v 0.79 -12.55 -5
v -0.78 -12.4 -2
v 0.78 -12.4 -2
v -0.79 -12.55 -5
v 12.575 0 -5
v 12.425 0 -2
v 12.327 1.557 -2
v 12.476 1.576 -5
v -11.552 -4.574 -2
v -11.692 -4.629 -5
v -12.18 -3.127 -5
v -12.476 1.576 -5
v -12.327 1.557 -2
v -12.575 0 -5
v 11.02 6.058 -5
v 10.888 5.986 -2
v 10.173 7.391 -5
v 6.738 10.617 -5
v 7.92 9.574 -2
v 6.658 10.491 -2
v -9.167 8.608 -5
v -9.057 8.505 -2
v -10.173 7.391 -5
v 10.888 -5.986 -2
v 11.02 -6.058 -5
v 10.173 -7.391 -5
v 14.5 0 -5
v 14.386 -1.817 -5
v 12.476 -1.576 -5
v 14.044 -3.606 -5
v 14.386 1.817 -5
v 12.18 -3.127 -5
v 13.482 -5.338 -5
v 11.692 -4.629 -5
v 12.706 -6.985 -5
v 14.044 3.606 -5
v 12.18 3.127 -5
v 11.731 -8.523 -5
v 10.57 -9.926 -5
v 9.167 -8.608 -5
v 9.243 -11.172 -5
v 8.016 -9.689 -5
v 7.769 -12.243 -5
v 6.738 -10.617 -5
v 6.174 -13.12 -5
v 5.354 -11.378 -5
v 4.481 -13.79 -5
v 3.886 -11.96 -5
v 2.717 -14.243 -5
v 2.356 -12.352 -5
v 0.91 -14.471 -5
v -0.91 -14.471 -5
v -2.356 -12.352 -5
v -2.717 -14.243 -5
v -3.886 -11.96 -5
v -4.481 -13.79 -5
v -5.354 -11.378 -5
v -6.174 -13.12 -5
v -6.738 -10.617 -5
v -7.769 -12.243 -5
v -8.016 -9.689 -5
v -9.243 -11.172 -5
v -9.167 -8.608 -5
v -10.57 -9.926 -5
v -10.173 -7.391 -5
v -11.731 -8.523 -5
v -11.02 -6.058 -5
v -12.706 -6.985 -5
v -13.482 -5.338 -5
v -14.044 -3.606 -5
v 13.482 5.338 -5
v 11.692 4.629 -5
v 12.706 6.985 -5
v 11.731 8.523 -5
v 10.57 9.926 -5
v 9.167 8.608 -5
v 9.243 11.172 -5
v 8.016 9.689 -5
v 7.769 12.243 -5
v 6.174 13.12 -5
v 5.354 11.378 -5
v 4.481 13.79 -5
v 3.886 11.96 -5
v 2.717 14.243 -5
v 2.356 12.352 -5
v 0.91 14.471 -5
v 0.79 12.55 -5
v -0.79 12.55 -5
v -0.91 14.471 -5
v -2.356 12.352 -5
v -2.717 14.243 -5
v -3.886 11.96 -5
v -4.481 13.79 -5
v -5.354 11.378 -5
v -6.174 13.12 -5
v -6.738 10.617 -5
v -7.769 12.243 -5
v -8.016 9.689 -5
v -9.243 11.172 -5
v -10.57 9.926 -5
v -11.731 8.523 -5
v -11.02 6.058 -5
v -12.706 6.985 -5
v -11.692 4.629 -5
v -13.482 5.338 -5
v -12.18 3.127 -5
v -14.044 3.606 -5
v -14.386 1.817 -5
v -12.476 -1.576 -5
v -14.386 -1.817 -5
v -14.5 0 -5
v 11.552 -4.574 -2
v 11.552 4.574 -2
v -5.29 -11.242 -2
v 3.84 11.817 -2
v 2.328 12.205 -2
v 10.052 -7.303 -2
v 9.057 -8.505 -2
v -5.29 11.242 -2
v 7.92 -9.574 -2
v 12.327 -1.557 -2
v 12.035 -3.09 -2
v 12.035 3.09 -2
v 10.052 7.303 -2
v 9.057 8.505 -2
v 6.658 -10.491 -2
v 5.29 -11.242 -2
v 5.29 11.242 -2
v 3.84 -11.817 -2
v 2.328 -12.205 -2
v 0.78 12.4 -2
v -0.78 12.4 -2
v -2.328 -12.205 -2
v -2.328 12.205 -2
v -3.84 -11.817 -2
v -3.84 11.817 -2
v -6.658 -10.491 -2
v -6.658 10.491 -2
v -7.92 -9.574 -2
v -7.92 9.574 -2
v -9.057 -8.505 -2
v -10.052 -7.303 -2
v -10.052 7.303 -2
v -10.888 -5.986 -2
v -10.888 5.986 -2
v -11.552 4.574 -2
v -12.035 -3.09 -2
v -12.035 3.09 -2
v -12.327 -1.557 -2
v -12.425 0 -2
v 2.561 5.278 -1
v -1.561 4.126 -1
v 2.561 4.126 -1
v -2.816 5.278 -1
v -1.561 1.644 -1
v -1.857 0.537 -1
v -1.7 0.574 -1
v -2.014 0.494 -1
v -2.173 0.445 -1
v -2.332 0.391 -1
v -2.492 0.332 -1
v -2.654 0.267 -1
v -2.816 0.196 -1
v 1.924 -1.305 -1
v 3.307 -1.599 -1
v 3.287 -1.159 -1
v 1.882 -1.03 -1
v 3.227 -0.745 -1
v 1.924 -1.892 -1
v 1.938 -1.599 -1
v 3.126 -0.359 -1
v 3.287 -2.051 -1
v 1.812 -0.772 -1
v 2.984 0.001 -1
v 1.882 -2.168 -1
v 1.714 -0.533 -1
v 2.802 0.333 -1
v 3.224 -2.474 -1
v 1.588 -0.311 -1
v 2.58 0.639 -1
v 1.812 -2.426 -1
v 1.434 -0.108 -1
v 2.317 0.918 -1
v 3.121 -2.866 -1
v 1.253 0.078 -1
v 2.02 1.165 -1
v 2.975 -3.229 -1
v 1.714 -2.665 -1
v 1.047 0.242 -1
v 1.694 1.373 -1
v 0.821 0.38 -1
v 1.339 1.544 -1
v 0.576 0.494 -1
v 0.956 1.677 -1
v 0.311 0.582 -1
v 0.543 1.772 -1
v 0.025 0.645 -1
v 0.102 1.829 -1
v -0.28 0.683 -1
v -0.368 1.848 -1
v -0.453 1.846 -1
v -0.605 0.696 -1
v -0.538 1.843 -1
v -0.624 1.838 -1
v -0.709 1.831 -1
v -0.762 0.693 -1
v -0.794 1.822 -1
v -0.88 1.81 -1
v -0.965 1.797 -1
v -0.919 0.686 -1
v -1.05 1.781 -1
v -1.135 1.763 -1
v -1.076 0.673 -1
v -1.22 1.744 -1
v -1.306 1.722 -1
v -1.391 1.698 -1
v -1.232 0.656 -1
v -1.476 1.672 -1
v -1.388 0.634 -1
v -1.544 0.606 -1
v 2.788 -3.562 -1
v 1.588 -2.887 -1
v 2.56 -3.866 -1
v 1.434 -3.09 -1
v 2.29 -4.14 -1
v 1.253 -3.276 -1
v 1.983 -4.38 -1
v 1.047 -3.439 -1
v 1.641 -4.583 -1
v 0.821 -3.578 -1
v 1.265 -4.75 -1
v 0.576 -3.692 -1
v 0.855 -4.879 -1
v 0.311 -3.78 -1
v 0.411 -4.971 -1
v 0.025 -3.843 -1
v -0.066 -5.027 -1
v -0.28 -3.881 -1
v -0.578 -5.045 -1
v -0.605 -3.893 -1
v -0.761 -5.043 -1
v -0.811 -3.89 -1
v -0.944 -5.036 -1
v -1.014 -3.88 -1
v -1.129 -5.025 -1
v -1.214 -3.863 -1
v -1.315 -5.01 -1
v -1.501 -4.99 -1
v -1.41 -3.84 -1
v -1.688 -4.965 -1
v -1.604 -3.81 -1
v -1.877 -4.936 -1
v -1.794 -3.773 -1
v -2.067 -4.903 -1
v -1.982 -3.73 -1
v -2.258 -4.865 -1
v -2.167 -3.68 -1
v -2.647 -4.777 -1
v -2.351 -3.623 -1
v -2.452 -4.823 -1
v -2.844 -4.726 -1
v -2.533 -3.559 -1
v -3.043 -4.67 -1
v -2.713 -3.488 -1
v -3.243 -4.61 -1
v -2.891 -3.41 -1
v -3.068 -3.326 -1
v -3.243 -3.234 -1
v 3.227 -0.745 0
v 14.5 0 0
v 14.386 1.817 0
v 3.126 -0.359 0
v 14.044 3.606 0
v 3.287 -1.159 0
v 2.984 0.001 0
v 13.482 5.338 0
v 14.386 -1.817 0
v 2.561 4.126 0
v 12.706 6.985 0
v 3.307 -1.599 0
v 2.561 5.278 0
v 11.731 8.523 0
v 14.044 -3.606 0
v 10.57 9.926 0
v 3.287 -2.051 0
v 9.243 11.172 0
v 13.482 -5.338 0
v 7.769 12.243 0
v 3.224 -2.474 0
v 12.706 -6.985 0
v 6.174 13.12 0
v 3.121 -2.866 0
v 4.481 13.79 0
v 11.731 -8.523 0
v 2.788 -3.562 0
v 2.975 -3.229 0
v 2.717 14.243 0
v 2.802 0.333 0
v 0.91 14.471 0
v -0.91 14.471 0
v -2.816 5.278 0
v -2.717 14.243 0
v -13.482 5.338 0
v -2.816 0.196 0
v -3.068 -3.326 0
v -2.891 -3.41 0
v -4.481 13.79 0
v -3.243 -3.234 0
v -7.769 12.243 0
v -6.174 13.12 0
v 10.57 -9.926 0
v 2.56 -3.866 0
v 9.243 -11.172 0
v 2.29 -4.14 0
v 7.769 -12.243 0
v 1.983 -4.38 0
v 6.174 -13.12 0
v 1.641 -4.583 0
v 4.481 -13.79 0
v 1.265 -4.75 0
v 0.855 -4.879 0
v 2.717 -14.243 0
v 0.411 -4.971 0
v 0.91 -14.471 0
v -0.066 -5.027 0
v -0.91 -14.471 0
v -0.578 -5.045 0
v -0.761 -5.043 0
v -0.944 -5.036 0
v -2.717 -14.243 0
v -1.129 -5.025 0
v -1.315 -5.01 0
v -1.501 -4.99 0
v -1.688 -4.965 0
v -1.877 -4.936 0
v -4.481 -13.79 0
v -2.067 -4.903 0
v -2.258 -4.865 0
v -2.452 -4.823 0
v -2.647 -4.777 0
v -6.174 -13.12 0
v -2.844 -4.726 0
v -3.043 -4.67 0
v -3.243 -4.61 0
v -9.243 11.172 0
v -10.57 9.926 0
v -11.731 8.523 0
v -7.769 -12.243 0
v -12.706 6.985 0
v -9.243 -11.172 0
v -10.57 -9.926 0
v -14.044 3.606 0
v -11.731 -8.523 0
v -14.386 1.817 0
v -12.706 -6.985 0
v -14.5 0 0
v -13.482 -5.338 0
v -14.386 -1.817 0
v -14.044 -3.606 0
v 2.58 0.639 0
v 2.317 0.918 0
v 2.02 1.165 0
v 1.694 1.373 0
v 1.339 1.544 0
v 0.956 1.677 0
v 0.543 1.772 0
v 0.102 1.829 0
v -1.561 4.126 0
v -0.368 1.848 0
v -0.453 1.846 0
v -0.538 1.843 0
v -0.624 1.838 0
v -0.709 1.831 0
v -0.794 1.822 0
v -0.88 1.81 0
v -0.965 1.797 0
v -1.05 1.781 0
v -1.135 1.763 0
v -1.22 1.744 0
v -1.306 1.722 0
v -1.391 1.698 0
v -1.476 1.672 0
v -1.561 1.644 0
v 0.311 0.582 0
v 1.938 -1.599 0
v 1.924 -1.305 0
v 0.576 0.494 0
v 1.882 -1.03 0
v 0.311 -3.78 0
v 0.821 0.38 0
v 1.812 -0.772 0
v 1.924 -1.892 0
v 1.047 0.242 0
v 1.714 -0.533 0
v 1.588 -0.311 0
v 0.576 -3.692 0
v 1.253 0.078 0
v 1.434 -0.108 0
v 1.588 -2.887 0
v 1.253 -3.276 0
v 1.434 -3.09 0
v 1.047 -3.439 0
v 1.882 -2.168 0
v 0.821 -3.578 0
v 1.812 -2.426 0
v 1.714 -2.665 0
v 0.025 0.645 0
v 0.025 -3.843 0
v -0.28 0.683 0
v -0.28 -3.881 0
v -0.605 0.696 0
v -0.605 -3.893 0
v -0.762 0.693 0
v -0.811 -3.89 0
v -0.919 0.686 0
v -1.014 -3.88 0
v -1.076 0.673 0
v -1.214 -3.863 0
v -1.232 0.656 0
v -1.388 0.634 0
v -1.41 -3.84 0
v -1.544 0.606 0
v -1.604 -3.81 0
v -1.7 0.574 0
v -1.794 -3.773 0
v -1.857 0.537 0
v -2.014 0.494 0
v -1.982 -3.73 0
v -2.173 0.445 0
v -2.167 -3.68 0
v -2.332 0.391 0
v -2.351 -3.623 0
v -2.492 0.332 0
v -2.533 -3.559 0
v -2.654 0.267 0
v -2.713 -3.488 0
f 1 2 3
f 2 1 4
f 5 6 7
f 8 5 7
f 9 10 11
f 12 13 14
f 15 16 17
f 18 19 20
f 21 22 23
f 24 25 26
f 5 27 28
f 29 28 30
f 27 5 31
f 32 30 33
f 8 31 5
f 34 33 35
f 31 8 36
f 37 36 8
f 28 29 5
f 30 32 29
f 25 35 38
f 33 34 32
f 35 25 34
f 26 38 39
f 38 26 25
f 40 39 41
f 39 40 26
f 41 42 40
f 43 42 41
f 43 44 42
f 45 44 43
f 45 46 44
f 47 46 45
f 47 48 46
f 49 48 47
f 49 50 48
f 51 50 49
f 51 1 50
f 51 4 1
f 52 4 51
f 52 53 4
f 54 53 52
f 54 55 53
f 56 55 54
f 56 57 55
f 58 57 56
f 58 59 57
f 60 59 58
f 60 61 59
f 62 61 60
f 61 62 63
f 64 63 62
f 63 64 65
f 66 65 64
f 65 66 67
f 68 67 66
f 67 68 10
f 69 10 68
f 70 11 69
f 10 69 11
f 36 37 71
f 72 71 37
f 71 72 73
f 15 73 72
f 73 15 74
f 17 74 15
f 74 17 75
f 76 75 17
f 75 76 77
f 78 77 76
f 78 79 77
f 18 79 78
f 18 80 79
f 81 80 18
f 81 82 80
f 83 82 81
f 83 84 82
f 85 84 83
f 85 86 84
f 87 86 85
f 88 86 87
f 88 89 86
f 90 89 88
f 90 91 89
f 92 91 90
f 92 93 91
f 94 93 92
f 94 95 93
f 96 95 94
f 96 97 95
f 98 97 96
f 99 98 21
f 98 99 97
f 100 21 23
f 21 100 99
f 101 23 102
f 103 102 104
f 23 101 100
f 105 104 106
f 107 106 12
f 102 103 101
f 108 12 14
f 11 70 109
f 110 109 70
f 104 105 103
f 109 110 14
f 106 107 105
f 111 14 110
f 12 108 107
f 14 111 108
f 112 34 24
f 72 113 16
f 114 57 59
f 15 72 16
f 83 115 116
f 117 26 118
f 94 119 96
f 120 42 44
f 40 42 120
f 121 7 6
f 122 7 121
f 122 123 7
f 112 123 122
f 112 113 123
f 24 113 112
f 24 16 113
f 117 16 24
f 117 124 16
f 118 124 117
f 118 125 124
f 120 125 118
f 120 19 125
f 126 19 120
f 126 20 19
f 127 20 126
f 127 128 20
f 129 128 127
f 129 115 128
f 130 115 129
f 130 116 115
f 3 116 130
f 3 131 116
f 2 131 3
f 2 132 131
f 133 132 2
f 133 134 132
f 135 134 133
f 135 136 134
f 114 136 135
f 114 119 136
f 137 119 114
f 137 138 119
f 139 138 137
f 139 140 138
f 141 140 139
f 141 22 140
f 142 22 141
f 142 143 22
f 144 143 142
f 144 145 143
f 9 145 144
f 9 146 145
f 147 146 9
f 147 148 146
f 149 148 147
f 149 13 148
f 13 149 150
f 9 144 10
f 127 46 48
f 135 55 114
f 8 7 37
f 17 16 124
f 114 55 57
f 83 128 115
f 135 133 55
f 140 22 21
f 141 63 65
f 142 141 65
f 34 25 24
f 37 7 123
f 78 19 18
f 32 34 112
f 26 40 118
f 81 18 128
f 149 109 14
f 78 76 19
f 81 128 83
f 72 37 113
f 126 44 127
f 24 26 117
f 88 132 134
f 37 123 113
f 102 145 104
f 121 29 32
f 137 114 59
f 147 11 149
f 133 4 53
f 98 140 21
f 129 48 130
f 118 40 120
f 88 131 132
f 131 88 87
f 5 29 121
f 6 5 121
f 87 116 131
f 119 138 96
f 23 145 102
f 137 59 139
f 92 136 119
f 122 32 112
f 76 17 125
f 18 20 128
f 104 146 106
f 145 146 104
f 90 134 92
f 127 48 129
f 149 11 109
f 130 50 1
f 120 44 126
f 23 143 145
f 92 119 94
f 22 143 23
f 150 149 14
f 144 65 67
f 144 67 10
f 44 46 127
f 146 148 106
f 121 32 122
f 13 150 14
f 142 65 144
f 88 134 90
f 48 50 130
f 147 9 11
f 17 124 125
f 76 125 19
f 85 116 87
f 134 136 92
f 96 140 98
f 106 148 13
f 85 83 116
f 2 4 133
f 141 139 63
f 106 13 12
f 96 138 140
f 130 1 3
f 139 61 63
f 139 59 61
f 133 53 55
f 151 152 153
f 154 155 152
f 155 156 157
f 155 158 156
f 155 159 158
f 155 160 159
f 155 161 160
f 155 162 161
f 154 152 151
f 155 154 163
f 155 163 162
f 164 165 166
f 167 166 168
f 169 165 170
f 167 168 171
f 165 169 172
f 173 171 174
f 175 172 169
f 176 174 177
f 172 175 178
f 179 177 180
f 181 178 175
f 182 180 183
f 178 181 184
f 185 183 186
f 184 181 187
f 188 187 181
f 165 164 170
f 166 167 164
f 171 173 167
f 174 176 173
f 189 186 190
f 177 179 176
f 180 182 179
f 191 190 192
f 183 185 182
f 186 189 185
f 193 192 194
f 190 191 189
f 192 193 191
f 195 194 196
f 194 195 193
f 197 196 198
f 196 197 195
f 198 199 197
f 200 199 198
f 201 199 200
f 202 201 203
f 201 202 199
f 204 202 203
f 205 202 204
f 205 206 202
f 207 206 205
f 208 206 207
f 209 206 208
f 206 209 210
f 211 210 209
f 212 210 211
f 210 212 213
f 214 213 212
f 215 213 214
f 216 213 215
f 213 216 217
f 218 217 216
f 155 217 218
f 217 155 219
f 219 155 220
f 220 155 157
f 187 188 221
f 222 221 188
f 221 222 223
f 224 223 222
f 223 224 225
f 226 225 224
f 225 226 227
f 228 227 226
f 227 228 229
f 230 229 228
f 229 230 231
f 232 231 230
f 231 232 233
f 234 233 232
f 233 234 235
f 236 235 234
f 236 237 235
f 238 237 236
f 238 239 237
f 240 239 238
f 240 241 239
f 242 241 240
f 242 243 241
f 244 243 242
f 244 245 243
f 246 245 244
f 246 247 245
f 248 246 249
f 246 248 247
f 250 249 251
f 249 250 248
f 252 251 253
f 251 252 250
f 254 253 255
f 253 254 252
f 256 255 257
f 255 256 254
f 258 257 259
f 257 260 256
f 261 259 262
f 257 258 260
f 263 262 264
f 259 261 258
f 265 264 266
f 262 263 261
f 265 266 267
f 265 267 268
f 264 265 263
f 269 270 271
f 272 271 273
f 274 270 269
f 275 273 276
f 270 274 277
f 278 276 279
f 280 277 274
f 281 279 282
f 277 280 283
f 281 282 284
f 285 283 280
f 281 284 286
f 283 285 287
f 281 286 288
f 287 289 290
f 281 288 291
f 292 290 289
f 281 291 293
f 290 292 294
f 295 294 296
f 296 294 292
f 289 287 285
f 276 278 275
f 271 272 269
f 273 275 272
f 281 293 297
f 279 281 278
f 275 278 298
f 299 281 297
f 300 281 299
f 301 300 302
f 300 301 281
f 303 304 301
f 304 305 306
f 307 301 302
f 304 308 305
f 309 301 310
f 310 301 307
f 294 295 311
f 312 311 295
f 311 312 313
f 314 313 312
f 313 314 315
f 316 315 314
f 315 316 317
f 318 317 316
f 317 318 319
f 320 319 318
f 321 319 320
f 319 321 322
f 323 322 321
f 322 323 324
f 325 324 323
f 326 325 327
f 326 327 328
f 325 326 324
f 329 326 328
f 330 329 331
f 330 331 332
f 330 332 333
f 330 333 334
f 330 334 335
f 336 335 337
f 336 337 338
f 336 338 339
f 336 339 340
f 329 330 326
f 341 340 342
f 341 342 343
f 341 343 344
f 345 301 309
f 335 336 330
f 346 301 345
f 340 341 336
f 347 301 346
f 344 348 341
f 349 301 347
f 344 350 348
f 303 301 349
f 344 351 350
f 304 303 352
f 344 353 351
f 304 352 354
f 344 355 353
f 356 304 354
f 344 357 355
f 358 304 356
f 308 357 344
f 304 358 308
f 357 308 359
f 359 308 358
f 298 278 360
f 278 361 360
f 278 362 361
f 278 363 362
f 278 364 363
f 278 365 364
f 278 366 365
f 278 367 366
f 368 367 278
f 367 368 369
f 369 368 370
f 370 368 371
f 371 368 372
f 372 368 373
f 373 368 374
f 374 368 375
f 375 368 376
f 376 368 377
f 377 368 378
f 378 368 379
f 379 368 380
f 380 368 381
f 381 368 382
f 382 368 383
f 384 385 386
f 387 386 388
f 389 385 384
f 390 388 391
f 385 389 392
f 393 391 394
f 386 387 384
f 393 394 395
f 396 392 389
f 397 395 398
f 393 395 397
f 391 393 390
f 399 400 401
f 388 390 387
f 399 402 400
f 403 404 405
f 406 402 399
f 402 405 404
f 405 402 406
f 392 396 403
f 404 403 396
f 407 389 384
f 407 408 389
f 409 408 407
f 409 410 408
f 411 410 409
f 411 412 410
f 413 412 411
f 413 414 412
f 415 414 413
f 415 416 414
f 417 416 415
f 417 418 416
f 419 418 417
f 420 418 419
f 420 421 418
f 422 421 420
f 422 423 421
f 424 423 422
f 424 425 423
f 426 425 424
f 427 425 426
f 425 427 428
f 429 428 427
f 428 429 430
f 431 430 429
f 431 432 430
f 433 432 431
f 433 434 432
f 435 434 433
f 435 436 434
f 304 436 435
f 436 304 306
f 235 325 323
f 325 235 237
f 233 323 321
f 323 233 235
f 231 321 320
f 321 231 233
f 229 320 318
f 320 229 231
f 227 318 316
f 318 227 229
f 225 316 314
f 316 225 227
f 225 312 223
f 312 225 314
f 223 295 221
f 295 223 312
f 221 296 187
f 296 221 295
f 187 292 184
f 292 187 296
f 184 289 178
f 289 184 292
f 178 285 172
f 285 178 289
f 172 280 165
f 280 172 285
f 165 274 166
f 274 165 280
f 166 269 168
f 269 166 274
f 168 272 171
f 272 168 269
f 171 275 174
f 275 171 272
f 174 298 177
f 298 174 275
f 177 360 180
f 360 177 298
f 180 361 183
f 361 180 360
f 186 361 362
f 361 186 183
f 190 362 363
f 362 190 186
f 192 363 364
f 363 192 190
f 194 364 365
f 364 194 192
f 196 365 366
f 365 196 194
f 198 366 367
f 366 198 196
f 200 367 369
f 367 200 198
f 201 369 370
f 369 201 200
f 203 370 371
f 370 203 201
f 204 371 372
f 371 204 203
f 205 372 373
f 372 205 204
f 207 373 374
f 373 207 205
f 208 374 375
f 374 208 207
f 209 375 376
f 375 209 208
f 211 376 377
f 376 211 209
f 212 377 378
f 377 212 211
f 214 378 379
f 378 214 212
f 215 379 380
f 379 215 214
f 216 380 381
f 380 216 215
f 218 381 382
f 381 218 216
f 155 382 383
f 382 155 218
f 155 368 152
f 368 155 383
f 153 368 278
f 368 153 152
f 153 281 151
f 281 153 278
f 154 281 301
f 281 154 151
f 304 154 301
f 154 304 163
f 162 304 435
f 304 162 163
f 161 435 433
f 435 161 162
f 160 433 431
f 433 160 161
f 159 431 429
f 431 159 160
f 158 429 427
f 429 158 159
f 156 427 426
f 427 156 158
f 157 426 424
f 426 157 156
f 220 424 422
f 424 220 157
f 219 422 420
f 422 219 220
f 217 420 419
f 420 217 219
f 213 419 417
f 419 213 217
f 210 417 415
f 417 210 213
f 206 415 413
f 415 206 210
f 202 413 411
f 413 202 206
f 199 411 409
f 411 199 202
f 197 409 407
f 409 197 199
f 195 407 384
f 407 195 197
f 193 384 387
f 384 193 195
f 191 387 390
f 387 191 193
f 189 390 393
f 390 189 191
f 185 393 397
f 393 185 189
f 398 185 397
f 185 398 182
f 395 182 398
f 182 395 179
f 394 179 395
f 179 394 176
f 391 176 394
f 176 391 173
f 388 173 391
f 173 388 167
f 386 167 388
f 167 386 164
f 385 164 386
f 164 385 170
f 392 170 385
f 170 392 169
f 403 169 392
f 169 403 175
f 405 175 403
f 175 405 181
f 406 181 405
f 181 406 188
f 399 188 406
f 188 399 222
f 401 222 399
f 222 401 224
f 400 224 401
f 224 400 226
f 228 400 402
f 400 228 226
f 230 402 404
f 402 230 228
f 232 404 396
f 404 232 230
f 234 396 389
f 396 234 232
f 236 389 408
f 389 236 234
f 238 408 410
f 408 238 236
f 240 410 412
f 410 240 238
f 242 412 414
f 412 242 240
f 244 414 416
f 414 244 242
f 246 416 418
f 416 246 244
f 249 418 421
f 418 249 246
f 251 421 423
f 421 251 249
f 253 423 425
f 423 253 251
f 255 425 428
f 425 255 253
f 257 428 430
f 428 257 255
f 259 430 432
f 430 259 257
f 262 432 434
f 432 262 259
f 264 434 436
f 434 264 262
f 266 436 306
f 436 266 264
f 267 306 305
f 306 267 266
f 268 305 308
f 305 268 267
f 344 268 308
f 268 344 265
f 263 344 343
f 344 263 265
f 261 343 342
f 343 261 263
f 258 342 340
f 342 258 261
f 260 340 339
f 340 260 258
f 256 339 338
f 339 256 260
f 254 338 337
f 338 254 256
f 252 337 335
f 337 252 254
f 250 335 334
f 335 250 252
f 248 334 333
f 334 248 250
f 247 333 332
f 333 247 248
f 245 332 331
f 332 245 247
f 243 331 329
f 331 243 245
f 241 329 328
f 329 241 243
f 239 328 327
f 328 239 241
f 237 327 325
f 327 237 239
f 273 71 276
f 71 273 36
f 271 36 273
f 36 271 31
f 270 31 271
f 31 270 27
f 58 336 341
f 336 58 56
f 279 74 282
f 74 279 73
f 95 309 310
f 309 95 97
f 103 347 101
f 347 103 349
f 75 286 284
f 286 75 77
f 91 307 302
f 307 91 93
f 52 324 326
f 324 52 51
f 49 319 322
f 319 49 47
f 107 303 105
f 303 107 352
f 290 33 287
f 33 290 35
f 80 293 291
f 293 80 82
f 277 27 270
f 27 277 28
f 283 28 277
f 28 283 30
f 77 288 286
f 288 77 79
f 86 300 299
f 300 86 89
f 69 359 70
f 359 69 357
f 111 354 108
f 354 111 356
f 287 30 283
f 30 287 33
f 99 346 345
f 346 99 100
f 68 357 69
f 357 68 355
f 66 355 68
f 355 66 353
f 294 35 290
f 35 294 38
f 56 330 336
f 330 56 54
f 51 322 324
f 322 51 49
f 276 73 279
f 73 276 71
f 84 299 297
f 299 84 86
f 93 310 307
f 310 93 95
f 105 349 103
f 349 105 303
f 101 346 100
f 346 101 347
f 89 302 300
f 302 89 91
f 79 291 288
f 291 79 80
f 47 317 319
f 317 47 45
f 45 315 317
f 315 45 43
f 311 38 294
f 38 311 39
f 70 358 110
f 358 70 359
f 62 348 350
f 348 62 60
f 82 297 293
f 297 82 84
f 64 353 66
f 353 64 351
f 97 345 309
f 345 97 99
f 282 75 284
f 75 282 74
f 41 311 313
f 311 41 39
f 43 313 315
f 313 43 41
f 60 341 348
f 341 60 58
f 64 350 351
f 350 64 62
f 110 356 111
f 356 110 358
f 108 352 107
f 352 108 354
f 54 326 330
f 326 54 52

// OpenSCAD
$fn = 50;

difference() {
	union() {
		translate(v = [0, 0, -5.0]) {
			cylinder(h = 5, r = 14.5);
		}
	}
	union() {
		#translate(v = [0, 0, -5.0]) {
			cylinder(h = 3, r1 = 12.575, r2 = 12.425);
		}
		translate(v = [0, 0, -1]) {
			linear_extrude(height = 1) {
				text(font = "Impact", halign = "center", size = 10, text = "5", valign = "center");
			}
		}
	}
}
